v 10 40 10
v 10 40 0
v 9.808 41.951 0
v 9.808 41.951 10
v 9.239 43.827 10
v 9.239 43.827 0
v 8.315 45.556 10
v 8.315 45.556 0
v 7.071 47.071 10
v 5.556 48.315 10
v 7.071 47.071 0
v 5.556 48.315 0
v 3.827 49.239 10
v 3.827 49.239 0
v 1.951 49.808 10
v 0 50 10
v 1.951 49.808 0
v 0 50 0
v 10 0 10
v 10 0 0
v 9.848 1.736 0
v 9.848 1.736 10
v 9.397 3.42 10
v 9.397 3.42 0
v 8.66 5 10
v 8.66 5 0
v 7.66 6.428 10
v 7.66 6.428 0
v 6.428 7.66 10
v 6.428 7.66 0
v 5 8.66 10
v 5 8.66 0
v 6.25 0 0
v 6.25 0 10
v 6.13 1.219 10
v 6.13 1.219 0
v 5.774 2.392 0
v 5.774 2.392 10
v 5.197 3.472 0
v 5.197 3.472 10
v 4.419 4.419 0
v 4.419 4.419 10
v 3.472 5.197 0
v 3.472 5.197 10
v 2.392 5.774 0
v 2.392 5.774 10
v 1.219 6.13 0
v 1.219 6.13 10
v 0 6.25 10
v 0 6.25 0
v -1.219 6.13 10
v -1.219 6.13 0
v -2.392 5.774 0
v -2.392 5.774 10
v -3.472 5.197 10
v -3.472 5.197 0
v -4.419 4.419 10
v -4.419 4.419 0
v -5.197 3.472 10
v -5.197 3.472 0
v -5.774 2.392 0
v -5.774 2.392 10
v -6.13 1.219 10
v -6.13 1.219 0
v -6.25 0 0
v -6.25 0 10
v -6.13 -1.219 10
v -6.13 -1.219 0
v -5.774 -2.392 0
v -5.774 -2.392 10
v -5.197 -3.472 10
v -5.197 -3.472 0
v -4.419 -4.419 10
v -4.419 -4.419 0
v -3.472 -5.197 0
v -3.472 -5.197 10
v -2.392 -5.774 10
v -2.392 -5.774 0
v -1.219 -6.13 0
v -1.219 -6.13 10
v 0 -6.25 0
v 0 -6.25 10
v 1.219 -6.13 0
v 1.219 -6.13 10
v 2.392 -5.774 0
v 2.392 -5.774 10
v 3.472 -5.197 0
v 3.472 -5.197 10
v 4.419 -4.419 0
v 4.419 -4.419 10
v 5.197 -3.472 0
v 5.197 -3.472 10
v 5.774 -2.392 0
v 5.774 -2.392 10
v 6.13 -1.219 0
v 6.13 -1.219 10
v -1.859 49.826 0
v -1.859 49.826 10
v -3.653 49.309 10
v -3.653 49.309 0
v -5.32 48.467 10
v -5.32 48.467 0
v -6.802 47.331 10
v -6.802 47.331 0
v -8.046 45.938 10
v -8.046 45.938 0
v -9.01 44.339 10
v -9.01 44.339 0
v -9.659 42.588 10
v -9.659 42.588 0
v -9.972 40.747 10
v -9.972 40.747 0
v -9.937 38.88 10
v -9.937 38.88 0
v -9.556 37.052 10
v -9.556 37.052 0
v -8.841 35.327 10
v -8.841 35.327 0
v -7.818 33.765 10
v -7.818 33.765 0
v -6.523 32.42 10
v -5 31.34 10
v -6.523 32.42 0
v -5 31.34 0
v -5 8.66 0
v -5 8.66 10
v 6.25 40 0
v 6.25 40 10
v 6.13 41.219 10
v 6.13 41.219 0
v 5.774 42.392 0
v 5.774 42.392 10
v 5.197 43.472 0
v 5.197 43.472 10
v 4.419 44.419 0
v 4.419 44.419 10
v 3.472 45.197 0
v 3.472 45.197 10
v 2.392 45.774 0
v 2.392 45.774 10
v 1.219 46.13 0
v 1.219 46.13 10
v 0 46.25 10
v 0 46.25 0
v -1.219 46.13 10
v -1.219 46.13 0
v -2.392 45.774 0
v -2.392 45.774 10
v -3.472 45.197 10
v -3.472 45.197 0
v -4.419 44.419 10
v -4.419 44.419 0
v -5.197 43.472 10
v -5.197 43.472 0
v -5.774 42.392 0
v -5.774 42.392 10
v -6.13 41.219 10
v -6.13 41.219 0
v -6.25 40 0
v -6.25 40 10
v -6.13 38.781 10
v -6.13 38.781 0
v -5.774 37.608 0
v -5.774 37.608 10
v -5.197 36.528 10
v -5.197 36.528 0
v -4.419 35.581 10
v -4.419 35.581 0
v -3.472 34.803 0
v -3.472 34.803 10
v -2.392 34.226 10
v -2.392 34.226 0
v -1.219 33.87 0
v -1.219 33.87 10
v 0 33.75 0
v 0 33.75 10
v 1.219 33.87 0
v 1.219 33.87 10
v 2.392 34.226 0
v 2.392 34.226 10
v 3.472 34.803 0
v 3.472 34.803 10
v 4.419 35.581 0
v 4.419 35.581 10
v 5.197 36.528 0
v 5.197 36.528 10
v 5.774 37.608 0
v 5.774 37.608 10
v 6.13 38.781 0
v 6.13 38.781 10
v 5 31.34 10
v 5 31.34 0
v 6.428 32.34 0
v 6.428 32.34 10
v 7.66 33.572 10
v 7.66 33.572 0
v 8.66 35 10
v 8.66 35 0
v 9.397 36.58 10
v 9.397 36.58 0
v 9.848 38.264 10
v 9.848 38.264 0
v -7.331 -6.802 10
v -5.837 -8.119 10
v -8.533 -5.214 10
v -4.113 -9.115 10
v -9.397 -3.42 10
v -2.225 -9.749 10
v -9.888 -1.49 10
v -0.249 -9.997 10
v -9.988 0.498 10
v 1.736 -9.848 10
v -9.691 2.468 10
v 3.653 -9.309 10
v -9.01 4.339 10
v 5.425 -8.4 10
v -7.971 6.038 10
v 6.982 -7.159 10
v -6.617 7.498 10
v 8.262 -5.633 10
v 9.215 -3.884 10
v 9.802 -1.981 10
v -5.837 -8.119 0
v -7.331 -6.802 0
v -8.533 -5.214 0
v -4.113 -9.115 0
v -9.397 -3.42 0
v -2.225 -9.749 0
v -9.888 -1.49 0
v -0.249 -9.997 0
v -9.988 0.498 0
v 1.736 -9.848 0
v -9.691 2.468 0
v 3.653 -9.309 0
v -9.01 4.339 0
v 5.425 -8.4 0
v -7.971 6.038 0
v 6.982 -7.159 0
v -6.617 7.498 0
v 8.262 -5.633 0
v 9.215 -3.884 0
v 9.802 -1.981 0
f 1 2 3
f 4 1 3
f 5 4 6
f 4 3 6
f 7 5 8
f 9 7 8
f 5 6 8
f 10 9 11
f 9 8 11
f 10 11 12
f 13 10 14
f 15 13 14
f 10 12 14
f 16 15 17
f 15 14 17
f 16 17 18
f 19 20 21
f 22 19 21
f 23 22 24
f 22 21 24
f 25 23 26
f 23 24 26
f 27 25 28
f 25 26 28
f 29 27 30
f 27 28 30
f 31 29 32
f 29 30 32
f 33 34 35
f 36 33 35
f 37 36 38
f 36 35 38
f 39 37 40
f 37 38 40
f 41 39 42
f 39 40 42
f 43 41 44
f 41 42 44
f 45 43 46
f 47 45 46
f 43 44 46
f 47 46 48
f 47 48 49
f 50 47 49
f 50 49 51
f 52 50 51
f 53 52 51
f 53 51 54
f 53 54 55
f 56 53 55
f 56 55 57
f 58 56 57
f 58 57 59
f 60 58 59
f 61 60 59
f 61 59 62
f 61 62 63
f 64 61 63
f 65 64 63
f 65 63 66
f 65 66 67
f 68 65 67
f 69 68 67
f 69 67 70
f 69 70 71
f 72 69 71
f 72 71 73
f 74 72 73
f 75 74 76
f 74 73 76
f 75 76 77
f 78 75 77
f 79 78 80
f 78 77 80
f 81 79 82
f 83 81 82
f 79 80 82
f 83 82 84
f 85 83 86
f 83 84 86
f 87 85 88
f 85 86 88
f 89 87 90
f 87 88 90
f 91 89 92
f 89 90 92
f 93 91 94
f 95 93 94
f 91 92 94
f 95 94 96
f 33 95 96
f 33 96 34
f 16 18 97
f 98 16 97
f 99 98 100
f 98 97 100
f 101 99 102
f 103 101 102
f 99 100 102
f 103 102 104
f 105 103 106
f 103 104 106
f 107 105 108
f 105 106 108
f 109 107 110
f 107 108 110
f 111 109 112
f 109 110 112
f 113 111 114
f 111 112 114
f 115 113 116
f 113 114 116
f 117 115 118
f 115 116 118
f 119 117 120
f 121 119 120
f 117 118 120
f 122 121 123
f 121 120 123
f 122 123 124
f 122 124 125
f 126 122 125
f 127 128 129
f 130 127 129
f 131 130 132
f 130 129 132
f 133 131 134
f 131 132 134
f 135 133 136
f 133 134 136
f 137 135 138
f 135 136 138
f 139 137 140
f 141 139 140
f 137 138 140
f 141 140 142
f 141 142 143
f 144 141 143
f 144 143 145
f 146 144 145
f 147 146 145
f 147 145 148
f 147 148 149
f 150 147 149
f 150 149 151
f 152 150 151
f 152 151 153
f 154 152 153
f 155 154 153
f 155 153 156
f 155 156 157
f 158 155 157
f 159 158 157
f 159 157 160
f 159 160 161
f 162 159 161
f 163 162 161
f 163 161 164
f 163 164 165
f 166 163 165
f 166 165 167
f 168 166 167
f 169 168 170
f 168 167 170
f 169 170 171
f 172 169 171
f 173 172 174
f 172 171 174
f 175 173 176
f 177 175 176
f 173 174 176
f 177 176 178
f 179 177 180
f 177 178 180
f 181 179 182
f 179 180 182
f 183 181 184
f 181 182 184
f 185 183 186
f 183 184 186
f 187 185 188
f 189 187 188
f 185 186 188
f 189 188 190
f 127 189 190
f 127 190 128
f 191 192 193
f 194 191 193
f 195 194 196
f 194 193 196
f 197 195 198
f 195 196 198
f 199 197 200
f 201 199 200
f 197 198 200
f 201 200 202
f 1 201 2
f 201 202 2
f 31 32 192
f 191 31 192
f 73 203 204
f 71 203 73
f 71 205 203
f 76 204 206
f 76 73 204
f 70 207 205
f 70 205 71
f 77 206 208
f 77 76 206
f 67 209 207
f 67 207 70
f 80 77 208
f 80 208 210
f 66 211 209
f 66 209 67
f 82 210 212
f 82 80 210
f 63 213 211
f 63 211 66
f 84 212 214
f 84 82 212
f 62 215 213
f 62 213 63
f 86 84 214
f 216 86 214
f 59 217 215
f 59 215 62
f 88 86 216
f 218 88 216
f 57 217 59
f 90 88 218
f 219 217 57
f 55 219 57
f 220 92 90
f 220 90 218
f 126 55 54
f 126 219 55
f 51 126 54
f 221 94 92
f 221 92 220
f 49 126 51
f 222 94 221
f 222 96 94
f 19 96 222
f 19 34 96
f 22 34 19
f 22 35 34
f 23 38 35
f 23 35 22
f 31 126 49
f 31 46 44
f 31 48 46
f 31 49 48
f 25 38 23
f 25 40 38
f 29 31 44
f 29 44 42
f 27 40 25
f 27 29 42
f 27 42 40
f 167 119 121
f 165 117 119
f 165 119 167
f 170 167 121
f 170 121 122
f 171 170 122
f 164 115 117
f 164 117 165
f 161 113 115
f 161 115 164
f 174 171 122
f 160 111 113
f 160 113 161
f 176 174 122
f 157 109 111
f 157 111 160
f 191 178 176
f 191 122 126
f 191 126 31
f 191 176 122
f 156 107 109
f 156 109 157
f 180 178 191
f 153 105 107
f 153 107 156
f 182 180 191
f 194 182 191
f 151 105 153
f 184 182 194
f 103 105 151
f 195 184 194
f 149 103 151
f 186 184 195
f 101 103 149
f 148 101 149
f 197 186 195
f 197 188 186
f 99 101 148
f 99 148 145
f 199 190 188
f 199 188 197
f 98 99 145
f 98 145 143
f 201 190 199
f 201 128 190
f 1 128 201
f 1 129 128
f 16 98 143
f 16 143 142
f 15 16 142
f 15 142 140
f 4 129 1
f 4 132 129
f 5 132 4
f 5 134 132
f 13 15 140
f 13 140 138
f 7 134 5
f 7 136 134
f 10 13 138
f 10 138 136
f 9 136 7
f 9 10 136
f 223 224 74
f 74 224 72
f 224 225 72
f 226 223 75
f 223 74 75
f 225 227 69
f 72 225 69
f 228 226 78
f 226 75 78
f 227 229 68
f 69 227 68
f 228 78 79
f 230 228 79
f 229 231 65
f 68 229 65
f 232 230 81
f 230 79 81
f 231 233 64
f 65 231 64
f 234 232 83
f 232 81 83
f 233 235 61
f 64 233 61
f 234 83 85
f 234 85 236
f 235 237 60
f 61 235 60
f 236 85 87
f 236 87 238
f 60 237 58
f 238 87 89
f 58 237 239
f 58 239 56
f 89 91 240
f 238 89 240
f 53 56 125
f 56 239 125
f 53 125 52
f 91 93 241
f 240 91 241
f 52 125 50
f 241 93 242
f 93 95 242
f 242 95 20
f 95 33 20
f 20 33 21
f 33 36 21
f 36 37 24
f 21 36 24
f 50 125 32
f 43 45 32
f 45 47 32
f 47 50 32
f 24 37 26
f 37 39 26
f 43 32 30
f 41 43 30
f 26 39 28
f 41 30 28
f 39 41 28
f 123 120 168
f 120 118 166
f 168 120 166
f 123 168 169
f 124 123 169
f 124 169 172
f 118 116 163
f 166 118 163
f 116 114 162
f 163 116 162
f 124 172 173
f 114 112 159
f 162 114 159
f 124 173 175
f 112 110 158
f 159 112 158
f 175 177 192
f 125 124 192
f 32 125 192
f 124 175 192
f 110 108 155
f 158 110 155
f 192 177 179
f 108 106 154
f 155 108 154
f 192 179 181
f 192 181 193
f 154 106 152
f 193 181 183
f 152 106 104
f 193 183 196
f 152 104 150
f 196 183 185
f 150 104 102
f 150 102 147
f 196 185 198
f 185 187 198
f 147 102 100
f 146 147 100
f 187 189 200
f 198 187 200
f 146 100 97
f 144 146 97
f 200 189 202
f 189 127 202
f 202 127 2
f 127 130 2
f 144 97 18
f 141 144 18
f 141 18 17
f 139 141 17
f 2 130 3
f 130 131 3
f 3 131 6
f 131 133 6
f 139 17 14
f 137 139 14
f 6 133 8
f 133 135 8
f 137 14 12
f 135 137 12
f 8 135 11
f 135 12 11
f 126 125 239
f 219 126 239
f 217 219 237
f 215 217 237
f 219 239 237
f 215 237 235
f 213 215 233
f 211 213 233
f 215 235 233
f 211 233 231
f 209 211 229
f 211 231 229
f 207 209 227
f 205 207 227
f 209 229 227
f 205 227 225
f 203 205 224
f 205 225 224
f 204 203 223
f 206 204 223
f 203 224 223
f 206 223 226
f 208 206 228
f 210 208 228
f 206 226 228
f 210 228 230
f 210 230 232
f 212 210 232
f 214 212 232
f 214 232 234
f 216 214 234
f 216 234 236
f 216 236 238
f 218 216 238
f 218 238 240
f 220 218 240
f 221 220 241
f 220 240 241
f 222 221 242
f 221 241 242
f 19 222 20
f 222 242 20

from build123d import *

# Parameters (mm, degrees)
BOSS_EXTRUDE1_DEPTH = 10
SKETCH2_R           = 6.25
CUT_EXTRUDE1_DEPTH  = 52.961524227


with BuildPart() as part:
    # Sketch1 → Boss-Extrude1 (new body)
    with BuildSketch(Plane.XY):
        with BuildLine():
            Line((0, 40), (0, 30))
            ThreePointArc((0, 30), (2.588190451, 30.340741737), (5, 31.339745962))
            Line((5, 31.339745962), (5, 40))
            Line((5, 40), (0, 40))
        make_face()
        with BuildLine():
            Line((0, 50), (0, 40))
            Line((0, 40), (5, 40))
            Line((5, 40), (5, 31.339745962))
            ThreePointArc((5, 31.339745962), (8.660254038, 35), (10, 40))
            ThreePointArc((10, 40), (7.071067812, 47.071067812), (0, 50))
        make_face()
        with BuildLine():
            ThreePointArc((-5, 31.339745962), (-2.588190451, 30.340741737), (0, 30))
            Line((0, 30), (0, 40))
            Line((0, 40), (-5, 40))
            Line((-5, 40), (-5, 31.339745962))
        make_face()
        with BuildLine():
            Line((-5, 40), (0, 40))
            Line((0, 40), (0, 50))
            ThreePointArc((0, 50), (-9.659258263, 42.588190451), (-5, 31.339745962))
            Line((-5, 31.339745962), (-5, 40))
        make_face()
        with BuildLine():
            Line((0, 30), (0, 10))
            ThreePointArc((0, 10), (2.588190451, 9.659258263), (5, 8.660254038))
            Line((5, 8.660254038), (5, 31.339745962))
            ThreePointArc((5, 31.339745962), (2.588190451, 30.340741737), (0, 30))
        make_face()
        with BuildLine():
            ThreePointArc((-5, 8.660254038), (-2.588190451, 9.659258263), (0, 10))
            Line((0, 10), (0, 30))
            ThreePointArc((0, 30), (-2.588190451, 30.340741737), (-5, 31.339745962))
            Line((-5, 31.339745962), (-5, 8.660254038))
        make_face()
        with BuildLine():
            Line((-5, 0), (0, 0))
            Line((0, 0), (0, 10))
            ThreePointArc((0, 10), (-2.588190451, 9.659258263), (-5, 8.660254038))
            Line((-5, 8.660254038), (-5, 0))
        make_face()
        with BuildLine():
            Line((0, 10), (0, 0))
            Line((0, 0), (5, 0))
            Line((5, 0), (5, 8.660254038))
            ThreePointArc((5, 8.660254038), (2.588190451, 9.659258263), (0, 10))
        make_face()
        with BuildLine():
            Line((5, 0), (0, 0))
            Line((0, 0), (-5, 0))
            Line((-5, 0), (-5, 8.660254038))
            ThreePointArc((-5, 8.660254038), (-5, -8.660254038), (10, 0))
            ThreePointArc((10, 0), (8.660254038, 5), (5, 8.660254038))
            Line((5, 8.660254038), (5, 0))
        make_face()
    extrude(amount=BOSS_EXTRUDE1_DEPTH)

    # Sketch2 → Cut-Extrude1 (cut, through all)
    with BuildSketch(Plane.XY.offset(10)):
        with Locations((0, 40)):
            Circle(SKETCH2_R)
        Circle(SKETCH2_R)
    extrude(amount=-CUT_EXTRUDE1_DEPTH, mode=Mode.SUBTRACT)


solid = part.part
